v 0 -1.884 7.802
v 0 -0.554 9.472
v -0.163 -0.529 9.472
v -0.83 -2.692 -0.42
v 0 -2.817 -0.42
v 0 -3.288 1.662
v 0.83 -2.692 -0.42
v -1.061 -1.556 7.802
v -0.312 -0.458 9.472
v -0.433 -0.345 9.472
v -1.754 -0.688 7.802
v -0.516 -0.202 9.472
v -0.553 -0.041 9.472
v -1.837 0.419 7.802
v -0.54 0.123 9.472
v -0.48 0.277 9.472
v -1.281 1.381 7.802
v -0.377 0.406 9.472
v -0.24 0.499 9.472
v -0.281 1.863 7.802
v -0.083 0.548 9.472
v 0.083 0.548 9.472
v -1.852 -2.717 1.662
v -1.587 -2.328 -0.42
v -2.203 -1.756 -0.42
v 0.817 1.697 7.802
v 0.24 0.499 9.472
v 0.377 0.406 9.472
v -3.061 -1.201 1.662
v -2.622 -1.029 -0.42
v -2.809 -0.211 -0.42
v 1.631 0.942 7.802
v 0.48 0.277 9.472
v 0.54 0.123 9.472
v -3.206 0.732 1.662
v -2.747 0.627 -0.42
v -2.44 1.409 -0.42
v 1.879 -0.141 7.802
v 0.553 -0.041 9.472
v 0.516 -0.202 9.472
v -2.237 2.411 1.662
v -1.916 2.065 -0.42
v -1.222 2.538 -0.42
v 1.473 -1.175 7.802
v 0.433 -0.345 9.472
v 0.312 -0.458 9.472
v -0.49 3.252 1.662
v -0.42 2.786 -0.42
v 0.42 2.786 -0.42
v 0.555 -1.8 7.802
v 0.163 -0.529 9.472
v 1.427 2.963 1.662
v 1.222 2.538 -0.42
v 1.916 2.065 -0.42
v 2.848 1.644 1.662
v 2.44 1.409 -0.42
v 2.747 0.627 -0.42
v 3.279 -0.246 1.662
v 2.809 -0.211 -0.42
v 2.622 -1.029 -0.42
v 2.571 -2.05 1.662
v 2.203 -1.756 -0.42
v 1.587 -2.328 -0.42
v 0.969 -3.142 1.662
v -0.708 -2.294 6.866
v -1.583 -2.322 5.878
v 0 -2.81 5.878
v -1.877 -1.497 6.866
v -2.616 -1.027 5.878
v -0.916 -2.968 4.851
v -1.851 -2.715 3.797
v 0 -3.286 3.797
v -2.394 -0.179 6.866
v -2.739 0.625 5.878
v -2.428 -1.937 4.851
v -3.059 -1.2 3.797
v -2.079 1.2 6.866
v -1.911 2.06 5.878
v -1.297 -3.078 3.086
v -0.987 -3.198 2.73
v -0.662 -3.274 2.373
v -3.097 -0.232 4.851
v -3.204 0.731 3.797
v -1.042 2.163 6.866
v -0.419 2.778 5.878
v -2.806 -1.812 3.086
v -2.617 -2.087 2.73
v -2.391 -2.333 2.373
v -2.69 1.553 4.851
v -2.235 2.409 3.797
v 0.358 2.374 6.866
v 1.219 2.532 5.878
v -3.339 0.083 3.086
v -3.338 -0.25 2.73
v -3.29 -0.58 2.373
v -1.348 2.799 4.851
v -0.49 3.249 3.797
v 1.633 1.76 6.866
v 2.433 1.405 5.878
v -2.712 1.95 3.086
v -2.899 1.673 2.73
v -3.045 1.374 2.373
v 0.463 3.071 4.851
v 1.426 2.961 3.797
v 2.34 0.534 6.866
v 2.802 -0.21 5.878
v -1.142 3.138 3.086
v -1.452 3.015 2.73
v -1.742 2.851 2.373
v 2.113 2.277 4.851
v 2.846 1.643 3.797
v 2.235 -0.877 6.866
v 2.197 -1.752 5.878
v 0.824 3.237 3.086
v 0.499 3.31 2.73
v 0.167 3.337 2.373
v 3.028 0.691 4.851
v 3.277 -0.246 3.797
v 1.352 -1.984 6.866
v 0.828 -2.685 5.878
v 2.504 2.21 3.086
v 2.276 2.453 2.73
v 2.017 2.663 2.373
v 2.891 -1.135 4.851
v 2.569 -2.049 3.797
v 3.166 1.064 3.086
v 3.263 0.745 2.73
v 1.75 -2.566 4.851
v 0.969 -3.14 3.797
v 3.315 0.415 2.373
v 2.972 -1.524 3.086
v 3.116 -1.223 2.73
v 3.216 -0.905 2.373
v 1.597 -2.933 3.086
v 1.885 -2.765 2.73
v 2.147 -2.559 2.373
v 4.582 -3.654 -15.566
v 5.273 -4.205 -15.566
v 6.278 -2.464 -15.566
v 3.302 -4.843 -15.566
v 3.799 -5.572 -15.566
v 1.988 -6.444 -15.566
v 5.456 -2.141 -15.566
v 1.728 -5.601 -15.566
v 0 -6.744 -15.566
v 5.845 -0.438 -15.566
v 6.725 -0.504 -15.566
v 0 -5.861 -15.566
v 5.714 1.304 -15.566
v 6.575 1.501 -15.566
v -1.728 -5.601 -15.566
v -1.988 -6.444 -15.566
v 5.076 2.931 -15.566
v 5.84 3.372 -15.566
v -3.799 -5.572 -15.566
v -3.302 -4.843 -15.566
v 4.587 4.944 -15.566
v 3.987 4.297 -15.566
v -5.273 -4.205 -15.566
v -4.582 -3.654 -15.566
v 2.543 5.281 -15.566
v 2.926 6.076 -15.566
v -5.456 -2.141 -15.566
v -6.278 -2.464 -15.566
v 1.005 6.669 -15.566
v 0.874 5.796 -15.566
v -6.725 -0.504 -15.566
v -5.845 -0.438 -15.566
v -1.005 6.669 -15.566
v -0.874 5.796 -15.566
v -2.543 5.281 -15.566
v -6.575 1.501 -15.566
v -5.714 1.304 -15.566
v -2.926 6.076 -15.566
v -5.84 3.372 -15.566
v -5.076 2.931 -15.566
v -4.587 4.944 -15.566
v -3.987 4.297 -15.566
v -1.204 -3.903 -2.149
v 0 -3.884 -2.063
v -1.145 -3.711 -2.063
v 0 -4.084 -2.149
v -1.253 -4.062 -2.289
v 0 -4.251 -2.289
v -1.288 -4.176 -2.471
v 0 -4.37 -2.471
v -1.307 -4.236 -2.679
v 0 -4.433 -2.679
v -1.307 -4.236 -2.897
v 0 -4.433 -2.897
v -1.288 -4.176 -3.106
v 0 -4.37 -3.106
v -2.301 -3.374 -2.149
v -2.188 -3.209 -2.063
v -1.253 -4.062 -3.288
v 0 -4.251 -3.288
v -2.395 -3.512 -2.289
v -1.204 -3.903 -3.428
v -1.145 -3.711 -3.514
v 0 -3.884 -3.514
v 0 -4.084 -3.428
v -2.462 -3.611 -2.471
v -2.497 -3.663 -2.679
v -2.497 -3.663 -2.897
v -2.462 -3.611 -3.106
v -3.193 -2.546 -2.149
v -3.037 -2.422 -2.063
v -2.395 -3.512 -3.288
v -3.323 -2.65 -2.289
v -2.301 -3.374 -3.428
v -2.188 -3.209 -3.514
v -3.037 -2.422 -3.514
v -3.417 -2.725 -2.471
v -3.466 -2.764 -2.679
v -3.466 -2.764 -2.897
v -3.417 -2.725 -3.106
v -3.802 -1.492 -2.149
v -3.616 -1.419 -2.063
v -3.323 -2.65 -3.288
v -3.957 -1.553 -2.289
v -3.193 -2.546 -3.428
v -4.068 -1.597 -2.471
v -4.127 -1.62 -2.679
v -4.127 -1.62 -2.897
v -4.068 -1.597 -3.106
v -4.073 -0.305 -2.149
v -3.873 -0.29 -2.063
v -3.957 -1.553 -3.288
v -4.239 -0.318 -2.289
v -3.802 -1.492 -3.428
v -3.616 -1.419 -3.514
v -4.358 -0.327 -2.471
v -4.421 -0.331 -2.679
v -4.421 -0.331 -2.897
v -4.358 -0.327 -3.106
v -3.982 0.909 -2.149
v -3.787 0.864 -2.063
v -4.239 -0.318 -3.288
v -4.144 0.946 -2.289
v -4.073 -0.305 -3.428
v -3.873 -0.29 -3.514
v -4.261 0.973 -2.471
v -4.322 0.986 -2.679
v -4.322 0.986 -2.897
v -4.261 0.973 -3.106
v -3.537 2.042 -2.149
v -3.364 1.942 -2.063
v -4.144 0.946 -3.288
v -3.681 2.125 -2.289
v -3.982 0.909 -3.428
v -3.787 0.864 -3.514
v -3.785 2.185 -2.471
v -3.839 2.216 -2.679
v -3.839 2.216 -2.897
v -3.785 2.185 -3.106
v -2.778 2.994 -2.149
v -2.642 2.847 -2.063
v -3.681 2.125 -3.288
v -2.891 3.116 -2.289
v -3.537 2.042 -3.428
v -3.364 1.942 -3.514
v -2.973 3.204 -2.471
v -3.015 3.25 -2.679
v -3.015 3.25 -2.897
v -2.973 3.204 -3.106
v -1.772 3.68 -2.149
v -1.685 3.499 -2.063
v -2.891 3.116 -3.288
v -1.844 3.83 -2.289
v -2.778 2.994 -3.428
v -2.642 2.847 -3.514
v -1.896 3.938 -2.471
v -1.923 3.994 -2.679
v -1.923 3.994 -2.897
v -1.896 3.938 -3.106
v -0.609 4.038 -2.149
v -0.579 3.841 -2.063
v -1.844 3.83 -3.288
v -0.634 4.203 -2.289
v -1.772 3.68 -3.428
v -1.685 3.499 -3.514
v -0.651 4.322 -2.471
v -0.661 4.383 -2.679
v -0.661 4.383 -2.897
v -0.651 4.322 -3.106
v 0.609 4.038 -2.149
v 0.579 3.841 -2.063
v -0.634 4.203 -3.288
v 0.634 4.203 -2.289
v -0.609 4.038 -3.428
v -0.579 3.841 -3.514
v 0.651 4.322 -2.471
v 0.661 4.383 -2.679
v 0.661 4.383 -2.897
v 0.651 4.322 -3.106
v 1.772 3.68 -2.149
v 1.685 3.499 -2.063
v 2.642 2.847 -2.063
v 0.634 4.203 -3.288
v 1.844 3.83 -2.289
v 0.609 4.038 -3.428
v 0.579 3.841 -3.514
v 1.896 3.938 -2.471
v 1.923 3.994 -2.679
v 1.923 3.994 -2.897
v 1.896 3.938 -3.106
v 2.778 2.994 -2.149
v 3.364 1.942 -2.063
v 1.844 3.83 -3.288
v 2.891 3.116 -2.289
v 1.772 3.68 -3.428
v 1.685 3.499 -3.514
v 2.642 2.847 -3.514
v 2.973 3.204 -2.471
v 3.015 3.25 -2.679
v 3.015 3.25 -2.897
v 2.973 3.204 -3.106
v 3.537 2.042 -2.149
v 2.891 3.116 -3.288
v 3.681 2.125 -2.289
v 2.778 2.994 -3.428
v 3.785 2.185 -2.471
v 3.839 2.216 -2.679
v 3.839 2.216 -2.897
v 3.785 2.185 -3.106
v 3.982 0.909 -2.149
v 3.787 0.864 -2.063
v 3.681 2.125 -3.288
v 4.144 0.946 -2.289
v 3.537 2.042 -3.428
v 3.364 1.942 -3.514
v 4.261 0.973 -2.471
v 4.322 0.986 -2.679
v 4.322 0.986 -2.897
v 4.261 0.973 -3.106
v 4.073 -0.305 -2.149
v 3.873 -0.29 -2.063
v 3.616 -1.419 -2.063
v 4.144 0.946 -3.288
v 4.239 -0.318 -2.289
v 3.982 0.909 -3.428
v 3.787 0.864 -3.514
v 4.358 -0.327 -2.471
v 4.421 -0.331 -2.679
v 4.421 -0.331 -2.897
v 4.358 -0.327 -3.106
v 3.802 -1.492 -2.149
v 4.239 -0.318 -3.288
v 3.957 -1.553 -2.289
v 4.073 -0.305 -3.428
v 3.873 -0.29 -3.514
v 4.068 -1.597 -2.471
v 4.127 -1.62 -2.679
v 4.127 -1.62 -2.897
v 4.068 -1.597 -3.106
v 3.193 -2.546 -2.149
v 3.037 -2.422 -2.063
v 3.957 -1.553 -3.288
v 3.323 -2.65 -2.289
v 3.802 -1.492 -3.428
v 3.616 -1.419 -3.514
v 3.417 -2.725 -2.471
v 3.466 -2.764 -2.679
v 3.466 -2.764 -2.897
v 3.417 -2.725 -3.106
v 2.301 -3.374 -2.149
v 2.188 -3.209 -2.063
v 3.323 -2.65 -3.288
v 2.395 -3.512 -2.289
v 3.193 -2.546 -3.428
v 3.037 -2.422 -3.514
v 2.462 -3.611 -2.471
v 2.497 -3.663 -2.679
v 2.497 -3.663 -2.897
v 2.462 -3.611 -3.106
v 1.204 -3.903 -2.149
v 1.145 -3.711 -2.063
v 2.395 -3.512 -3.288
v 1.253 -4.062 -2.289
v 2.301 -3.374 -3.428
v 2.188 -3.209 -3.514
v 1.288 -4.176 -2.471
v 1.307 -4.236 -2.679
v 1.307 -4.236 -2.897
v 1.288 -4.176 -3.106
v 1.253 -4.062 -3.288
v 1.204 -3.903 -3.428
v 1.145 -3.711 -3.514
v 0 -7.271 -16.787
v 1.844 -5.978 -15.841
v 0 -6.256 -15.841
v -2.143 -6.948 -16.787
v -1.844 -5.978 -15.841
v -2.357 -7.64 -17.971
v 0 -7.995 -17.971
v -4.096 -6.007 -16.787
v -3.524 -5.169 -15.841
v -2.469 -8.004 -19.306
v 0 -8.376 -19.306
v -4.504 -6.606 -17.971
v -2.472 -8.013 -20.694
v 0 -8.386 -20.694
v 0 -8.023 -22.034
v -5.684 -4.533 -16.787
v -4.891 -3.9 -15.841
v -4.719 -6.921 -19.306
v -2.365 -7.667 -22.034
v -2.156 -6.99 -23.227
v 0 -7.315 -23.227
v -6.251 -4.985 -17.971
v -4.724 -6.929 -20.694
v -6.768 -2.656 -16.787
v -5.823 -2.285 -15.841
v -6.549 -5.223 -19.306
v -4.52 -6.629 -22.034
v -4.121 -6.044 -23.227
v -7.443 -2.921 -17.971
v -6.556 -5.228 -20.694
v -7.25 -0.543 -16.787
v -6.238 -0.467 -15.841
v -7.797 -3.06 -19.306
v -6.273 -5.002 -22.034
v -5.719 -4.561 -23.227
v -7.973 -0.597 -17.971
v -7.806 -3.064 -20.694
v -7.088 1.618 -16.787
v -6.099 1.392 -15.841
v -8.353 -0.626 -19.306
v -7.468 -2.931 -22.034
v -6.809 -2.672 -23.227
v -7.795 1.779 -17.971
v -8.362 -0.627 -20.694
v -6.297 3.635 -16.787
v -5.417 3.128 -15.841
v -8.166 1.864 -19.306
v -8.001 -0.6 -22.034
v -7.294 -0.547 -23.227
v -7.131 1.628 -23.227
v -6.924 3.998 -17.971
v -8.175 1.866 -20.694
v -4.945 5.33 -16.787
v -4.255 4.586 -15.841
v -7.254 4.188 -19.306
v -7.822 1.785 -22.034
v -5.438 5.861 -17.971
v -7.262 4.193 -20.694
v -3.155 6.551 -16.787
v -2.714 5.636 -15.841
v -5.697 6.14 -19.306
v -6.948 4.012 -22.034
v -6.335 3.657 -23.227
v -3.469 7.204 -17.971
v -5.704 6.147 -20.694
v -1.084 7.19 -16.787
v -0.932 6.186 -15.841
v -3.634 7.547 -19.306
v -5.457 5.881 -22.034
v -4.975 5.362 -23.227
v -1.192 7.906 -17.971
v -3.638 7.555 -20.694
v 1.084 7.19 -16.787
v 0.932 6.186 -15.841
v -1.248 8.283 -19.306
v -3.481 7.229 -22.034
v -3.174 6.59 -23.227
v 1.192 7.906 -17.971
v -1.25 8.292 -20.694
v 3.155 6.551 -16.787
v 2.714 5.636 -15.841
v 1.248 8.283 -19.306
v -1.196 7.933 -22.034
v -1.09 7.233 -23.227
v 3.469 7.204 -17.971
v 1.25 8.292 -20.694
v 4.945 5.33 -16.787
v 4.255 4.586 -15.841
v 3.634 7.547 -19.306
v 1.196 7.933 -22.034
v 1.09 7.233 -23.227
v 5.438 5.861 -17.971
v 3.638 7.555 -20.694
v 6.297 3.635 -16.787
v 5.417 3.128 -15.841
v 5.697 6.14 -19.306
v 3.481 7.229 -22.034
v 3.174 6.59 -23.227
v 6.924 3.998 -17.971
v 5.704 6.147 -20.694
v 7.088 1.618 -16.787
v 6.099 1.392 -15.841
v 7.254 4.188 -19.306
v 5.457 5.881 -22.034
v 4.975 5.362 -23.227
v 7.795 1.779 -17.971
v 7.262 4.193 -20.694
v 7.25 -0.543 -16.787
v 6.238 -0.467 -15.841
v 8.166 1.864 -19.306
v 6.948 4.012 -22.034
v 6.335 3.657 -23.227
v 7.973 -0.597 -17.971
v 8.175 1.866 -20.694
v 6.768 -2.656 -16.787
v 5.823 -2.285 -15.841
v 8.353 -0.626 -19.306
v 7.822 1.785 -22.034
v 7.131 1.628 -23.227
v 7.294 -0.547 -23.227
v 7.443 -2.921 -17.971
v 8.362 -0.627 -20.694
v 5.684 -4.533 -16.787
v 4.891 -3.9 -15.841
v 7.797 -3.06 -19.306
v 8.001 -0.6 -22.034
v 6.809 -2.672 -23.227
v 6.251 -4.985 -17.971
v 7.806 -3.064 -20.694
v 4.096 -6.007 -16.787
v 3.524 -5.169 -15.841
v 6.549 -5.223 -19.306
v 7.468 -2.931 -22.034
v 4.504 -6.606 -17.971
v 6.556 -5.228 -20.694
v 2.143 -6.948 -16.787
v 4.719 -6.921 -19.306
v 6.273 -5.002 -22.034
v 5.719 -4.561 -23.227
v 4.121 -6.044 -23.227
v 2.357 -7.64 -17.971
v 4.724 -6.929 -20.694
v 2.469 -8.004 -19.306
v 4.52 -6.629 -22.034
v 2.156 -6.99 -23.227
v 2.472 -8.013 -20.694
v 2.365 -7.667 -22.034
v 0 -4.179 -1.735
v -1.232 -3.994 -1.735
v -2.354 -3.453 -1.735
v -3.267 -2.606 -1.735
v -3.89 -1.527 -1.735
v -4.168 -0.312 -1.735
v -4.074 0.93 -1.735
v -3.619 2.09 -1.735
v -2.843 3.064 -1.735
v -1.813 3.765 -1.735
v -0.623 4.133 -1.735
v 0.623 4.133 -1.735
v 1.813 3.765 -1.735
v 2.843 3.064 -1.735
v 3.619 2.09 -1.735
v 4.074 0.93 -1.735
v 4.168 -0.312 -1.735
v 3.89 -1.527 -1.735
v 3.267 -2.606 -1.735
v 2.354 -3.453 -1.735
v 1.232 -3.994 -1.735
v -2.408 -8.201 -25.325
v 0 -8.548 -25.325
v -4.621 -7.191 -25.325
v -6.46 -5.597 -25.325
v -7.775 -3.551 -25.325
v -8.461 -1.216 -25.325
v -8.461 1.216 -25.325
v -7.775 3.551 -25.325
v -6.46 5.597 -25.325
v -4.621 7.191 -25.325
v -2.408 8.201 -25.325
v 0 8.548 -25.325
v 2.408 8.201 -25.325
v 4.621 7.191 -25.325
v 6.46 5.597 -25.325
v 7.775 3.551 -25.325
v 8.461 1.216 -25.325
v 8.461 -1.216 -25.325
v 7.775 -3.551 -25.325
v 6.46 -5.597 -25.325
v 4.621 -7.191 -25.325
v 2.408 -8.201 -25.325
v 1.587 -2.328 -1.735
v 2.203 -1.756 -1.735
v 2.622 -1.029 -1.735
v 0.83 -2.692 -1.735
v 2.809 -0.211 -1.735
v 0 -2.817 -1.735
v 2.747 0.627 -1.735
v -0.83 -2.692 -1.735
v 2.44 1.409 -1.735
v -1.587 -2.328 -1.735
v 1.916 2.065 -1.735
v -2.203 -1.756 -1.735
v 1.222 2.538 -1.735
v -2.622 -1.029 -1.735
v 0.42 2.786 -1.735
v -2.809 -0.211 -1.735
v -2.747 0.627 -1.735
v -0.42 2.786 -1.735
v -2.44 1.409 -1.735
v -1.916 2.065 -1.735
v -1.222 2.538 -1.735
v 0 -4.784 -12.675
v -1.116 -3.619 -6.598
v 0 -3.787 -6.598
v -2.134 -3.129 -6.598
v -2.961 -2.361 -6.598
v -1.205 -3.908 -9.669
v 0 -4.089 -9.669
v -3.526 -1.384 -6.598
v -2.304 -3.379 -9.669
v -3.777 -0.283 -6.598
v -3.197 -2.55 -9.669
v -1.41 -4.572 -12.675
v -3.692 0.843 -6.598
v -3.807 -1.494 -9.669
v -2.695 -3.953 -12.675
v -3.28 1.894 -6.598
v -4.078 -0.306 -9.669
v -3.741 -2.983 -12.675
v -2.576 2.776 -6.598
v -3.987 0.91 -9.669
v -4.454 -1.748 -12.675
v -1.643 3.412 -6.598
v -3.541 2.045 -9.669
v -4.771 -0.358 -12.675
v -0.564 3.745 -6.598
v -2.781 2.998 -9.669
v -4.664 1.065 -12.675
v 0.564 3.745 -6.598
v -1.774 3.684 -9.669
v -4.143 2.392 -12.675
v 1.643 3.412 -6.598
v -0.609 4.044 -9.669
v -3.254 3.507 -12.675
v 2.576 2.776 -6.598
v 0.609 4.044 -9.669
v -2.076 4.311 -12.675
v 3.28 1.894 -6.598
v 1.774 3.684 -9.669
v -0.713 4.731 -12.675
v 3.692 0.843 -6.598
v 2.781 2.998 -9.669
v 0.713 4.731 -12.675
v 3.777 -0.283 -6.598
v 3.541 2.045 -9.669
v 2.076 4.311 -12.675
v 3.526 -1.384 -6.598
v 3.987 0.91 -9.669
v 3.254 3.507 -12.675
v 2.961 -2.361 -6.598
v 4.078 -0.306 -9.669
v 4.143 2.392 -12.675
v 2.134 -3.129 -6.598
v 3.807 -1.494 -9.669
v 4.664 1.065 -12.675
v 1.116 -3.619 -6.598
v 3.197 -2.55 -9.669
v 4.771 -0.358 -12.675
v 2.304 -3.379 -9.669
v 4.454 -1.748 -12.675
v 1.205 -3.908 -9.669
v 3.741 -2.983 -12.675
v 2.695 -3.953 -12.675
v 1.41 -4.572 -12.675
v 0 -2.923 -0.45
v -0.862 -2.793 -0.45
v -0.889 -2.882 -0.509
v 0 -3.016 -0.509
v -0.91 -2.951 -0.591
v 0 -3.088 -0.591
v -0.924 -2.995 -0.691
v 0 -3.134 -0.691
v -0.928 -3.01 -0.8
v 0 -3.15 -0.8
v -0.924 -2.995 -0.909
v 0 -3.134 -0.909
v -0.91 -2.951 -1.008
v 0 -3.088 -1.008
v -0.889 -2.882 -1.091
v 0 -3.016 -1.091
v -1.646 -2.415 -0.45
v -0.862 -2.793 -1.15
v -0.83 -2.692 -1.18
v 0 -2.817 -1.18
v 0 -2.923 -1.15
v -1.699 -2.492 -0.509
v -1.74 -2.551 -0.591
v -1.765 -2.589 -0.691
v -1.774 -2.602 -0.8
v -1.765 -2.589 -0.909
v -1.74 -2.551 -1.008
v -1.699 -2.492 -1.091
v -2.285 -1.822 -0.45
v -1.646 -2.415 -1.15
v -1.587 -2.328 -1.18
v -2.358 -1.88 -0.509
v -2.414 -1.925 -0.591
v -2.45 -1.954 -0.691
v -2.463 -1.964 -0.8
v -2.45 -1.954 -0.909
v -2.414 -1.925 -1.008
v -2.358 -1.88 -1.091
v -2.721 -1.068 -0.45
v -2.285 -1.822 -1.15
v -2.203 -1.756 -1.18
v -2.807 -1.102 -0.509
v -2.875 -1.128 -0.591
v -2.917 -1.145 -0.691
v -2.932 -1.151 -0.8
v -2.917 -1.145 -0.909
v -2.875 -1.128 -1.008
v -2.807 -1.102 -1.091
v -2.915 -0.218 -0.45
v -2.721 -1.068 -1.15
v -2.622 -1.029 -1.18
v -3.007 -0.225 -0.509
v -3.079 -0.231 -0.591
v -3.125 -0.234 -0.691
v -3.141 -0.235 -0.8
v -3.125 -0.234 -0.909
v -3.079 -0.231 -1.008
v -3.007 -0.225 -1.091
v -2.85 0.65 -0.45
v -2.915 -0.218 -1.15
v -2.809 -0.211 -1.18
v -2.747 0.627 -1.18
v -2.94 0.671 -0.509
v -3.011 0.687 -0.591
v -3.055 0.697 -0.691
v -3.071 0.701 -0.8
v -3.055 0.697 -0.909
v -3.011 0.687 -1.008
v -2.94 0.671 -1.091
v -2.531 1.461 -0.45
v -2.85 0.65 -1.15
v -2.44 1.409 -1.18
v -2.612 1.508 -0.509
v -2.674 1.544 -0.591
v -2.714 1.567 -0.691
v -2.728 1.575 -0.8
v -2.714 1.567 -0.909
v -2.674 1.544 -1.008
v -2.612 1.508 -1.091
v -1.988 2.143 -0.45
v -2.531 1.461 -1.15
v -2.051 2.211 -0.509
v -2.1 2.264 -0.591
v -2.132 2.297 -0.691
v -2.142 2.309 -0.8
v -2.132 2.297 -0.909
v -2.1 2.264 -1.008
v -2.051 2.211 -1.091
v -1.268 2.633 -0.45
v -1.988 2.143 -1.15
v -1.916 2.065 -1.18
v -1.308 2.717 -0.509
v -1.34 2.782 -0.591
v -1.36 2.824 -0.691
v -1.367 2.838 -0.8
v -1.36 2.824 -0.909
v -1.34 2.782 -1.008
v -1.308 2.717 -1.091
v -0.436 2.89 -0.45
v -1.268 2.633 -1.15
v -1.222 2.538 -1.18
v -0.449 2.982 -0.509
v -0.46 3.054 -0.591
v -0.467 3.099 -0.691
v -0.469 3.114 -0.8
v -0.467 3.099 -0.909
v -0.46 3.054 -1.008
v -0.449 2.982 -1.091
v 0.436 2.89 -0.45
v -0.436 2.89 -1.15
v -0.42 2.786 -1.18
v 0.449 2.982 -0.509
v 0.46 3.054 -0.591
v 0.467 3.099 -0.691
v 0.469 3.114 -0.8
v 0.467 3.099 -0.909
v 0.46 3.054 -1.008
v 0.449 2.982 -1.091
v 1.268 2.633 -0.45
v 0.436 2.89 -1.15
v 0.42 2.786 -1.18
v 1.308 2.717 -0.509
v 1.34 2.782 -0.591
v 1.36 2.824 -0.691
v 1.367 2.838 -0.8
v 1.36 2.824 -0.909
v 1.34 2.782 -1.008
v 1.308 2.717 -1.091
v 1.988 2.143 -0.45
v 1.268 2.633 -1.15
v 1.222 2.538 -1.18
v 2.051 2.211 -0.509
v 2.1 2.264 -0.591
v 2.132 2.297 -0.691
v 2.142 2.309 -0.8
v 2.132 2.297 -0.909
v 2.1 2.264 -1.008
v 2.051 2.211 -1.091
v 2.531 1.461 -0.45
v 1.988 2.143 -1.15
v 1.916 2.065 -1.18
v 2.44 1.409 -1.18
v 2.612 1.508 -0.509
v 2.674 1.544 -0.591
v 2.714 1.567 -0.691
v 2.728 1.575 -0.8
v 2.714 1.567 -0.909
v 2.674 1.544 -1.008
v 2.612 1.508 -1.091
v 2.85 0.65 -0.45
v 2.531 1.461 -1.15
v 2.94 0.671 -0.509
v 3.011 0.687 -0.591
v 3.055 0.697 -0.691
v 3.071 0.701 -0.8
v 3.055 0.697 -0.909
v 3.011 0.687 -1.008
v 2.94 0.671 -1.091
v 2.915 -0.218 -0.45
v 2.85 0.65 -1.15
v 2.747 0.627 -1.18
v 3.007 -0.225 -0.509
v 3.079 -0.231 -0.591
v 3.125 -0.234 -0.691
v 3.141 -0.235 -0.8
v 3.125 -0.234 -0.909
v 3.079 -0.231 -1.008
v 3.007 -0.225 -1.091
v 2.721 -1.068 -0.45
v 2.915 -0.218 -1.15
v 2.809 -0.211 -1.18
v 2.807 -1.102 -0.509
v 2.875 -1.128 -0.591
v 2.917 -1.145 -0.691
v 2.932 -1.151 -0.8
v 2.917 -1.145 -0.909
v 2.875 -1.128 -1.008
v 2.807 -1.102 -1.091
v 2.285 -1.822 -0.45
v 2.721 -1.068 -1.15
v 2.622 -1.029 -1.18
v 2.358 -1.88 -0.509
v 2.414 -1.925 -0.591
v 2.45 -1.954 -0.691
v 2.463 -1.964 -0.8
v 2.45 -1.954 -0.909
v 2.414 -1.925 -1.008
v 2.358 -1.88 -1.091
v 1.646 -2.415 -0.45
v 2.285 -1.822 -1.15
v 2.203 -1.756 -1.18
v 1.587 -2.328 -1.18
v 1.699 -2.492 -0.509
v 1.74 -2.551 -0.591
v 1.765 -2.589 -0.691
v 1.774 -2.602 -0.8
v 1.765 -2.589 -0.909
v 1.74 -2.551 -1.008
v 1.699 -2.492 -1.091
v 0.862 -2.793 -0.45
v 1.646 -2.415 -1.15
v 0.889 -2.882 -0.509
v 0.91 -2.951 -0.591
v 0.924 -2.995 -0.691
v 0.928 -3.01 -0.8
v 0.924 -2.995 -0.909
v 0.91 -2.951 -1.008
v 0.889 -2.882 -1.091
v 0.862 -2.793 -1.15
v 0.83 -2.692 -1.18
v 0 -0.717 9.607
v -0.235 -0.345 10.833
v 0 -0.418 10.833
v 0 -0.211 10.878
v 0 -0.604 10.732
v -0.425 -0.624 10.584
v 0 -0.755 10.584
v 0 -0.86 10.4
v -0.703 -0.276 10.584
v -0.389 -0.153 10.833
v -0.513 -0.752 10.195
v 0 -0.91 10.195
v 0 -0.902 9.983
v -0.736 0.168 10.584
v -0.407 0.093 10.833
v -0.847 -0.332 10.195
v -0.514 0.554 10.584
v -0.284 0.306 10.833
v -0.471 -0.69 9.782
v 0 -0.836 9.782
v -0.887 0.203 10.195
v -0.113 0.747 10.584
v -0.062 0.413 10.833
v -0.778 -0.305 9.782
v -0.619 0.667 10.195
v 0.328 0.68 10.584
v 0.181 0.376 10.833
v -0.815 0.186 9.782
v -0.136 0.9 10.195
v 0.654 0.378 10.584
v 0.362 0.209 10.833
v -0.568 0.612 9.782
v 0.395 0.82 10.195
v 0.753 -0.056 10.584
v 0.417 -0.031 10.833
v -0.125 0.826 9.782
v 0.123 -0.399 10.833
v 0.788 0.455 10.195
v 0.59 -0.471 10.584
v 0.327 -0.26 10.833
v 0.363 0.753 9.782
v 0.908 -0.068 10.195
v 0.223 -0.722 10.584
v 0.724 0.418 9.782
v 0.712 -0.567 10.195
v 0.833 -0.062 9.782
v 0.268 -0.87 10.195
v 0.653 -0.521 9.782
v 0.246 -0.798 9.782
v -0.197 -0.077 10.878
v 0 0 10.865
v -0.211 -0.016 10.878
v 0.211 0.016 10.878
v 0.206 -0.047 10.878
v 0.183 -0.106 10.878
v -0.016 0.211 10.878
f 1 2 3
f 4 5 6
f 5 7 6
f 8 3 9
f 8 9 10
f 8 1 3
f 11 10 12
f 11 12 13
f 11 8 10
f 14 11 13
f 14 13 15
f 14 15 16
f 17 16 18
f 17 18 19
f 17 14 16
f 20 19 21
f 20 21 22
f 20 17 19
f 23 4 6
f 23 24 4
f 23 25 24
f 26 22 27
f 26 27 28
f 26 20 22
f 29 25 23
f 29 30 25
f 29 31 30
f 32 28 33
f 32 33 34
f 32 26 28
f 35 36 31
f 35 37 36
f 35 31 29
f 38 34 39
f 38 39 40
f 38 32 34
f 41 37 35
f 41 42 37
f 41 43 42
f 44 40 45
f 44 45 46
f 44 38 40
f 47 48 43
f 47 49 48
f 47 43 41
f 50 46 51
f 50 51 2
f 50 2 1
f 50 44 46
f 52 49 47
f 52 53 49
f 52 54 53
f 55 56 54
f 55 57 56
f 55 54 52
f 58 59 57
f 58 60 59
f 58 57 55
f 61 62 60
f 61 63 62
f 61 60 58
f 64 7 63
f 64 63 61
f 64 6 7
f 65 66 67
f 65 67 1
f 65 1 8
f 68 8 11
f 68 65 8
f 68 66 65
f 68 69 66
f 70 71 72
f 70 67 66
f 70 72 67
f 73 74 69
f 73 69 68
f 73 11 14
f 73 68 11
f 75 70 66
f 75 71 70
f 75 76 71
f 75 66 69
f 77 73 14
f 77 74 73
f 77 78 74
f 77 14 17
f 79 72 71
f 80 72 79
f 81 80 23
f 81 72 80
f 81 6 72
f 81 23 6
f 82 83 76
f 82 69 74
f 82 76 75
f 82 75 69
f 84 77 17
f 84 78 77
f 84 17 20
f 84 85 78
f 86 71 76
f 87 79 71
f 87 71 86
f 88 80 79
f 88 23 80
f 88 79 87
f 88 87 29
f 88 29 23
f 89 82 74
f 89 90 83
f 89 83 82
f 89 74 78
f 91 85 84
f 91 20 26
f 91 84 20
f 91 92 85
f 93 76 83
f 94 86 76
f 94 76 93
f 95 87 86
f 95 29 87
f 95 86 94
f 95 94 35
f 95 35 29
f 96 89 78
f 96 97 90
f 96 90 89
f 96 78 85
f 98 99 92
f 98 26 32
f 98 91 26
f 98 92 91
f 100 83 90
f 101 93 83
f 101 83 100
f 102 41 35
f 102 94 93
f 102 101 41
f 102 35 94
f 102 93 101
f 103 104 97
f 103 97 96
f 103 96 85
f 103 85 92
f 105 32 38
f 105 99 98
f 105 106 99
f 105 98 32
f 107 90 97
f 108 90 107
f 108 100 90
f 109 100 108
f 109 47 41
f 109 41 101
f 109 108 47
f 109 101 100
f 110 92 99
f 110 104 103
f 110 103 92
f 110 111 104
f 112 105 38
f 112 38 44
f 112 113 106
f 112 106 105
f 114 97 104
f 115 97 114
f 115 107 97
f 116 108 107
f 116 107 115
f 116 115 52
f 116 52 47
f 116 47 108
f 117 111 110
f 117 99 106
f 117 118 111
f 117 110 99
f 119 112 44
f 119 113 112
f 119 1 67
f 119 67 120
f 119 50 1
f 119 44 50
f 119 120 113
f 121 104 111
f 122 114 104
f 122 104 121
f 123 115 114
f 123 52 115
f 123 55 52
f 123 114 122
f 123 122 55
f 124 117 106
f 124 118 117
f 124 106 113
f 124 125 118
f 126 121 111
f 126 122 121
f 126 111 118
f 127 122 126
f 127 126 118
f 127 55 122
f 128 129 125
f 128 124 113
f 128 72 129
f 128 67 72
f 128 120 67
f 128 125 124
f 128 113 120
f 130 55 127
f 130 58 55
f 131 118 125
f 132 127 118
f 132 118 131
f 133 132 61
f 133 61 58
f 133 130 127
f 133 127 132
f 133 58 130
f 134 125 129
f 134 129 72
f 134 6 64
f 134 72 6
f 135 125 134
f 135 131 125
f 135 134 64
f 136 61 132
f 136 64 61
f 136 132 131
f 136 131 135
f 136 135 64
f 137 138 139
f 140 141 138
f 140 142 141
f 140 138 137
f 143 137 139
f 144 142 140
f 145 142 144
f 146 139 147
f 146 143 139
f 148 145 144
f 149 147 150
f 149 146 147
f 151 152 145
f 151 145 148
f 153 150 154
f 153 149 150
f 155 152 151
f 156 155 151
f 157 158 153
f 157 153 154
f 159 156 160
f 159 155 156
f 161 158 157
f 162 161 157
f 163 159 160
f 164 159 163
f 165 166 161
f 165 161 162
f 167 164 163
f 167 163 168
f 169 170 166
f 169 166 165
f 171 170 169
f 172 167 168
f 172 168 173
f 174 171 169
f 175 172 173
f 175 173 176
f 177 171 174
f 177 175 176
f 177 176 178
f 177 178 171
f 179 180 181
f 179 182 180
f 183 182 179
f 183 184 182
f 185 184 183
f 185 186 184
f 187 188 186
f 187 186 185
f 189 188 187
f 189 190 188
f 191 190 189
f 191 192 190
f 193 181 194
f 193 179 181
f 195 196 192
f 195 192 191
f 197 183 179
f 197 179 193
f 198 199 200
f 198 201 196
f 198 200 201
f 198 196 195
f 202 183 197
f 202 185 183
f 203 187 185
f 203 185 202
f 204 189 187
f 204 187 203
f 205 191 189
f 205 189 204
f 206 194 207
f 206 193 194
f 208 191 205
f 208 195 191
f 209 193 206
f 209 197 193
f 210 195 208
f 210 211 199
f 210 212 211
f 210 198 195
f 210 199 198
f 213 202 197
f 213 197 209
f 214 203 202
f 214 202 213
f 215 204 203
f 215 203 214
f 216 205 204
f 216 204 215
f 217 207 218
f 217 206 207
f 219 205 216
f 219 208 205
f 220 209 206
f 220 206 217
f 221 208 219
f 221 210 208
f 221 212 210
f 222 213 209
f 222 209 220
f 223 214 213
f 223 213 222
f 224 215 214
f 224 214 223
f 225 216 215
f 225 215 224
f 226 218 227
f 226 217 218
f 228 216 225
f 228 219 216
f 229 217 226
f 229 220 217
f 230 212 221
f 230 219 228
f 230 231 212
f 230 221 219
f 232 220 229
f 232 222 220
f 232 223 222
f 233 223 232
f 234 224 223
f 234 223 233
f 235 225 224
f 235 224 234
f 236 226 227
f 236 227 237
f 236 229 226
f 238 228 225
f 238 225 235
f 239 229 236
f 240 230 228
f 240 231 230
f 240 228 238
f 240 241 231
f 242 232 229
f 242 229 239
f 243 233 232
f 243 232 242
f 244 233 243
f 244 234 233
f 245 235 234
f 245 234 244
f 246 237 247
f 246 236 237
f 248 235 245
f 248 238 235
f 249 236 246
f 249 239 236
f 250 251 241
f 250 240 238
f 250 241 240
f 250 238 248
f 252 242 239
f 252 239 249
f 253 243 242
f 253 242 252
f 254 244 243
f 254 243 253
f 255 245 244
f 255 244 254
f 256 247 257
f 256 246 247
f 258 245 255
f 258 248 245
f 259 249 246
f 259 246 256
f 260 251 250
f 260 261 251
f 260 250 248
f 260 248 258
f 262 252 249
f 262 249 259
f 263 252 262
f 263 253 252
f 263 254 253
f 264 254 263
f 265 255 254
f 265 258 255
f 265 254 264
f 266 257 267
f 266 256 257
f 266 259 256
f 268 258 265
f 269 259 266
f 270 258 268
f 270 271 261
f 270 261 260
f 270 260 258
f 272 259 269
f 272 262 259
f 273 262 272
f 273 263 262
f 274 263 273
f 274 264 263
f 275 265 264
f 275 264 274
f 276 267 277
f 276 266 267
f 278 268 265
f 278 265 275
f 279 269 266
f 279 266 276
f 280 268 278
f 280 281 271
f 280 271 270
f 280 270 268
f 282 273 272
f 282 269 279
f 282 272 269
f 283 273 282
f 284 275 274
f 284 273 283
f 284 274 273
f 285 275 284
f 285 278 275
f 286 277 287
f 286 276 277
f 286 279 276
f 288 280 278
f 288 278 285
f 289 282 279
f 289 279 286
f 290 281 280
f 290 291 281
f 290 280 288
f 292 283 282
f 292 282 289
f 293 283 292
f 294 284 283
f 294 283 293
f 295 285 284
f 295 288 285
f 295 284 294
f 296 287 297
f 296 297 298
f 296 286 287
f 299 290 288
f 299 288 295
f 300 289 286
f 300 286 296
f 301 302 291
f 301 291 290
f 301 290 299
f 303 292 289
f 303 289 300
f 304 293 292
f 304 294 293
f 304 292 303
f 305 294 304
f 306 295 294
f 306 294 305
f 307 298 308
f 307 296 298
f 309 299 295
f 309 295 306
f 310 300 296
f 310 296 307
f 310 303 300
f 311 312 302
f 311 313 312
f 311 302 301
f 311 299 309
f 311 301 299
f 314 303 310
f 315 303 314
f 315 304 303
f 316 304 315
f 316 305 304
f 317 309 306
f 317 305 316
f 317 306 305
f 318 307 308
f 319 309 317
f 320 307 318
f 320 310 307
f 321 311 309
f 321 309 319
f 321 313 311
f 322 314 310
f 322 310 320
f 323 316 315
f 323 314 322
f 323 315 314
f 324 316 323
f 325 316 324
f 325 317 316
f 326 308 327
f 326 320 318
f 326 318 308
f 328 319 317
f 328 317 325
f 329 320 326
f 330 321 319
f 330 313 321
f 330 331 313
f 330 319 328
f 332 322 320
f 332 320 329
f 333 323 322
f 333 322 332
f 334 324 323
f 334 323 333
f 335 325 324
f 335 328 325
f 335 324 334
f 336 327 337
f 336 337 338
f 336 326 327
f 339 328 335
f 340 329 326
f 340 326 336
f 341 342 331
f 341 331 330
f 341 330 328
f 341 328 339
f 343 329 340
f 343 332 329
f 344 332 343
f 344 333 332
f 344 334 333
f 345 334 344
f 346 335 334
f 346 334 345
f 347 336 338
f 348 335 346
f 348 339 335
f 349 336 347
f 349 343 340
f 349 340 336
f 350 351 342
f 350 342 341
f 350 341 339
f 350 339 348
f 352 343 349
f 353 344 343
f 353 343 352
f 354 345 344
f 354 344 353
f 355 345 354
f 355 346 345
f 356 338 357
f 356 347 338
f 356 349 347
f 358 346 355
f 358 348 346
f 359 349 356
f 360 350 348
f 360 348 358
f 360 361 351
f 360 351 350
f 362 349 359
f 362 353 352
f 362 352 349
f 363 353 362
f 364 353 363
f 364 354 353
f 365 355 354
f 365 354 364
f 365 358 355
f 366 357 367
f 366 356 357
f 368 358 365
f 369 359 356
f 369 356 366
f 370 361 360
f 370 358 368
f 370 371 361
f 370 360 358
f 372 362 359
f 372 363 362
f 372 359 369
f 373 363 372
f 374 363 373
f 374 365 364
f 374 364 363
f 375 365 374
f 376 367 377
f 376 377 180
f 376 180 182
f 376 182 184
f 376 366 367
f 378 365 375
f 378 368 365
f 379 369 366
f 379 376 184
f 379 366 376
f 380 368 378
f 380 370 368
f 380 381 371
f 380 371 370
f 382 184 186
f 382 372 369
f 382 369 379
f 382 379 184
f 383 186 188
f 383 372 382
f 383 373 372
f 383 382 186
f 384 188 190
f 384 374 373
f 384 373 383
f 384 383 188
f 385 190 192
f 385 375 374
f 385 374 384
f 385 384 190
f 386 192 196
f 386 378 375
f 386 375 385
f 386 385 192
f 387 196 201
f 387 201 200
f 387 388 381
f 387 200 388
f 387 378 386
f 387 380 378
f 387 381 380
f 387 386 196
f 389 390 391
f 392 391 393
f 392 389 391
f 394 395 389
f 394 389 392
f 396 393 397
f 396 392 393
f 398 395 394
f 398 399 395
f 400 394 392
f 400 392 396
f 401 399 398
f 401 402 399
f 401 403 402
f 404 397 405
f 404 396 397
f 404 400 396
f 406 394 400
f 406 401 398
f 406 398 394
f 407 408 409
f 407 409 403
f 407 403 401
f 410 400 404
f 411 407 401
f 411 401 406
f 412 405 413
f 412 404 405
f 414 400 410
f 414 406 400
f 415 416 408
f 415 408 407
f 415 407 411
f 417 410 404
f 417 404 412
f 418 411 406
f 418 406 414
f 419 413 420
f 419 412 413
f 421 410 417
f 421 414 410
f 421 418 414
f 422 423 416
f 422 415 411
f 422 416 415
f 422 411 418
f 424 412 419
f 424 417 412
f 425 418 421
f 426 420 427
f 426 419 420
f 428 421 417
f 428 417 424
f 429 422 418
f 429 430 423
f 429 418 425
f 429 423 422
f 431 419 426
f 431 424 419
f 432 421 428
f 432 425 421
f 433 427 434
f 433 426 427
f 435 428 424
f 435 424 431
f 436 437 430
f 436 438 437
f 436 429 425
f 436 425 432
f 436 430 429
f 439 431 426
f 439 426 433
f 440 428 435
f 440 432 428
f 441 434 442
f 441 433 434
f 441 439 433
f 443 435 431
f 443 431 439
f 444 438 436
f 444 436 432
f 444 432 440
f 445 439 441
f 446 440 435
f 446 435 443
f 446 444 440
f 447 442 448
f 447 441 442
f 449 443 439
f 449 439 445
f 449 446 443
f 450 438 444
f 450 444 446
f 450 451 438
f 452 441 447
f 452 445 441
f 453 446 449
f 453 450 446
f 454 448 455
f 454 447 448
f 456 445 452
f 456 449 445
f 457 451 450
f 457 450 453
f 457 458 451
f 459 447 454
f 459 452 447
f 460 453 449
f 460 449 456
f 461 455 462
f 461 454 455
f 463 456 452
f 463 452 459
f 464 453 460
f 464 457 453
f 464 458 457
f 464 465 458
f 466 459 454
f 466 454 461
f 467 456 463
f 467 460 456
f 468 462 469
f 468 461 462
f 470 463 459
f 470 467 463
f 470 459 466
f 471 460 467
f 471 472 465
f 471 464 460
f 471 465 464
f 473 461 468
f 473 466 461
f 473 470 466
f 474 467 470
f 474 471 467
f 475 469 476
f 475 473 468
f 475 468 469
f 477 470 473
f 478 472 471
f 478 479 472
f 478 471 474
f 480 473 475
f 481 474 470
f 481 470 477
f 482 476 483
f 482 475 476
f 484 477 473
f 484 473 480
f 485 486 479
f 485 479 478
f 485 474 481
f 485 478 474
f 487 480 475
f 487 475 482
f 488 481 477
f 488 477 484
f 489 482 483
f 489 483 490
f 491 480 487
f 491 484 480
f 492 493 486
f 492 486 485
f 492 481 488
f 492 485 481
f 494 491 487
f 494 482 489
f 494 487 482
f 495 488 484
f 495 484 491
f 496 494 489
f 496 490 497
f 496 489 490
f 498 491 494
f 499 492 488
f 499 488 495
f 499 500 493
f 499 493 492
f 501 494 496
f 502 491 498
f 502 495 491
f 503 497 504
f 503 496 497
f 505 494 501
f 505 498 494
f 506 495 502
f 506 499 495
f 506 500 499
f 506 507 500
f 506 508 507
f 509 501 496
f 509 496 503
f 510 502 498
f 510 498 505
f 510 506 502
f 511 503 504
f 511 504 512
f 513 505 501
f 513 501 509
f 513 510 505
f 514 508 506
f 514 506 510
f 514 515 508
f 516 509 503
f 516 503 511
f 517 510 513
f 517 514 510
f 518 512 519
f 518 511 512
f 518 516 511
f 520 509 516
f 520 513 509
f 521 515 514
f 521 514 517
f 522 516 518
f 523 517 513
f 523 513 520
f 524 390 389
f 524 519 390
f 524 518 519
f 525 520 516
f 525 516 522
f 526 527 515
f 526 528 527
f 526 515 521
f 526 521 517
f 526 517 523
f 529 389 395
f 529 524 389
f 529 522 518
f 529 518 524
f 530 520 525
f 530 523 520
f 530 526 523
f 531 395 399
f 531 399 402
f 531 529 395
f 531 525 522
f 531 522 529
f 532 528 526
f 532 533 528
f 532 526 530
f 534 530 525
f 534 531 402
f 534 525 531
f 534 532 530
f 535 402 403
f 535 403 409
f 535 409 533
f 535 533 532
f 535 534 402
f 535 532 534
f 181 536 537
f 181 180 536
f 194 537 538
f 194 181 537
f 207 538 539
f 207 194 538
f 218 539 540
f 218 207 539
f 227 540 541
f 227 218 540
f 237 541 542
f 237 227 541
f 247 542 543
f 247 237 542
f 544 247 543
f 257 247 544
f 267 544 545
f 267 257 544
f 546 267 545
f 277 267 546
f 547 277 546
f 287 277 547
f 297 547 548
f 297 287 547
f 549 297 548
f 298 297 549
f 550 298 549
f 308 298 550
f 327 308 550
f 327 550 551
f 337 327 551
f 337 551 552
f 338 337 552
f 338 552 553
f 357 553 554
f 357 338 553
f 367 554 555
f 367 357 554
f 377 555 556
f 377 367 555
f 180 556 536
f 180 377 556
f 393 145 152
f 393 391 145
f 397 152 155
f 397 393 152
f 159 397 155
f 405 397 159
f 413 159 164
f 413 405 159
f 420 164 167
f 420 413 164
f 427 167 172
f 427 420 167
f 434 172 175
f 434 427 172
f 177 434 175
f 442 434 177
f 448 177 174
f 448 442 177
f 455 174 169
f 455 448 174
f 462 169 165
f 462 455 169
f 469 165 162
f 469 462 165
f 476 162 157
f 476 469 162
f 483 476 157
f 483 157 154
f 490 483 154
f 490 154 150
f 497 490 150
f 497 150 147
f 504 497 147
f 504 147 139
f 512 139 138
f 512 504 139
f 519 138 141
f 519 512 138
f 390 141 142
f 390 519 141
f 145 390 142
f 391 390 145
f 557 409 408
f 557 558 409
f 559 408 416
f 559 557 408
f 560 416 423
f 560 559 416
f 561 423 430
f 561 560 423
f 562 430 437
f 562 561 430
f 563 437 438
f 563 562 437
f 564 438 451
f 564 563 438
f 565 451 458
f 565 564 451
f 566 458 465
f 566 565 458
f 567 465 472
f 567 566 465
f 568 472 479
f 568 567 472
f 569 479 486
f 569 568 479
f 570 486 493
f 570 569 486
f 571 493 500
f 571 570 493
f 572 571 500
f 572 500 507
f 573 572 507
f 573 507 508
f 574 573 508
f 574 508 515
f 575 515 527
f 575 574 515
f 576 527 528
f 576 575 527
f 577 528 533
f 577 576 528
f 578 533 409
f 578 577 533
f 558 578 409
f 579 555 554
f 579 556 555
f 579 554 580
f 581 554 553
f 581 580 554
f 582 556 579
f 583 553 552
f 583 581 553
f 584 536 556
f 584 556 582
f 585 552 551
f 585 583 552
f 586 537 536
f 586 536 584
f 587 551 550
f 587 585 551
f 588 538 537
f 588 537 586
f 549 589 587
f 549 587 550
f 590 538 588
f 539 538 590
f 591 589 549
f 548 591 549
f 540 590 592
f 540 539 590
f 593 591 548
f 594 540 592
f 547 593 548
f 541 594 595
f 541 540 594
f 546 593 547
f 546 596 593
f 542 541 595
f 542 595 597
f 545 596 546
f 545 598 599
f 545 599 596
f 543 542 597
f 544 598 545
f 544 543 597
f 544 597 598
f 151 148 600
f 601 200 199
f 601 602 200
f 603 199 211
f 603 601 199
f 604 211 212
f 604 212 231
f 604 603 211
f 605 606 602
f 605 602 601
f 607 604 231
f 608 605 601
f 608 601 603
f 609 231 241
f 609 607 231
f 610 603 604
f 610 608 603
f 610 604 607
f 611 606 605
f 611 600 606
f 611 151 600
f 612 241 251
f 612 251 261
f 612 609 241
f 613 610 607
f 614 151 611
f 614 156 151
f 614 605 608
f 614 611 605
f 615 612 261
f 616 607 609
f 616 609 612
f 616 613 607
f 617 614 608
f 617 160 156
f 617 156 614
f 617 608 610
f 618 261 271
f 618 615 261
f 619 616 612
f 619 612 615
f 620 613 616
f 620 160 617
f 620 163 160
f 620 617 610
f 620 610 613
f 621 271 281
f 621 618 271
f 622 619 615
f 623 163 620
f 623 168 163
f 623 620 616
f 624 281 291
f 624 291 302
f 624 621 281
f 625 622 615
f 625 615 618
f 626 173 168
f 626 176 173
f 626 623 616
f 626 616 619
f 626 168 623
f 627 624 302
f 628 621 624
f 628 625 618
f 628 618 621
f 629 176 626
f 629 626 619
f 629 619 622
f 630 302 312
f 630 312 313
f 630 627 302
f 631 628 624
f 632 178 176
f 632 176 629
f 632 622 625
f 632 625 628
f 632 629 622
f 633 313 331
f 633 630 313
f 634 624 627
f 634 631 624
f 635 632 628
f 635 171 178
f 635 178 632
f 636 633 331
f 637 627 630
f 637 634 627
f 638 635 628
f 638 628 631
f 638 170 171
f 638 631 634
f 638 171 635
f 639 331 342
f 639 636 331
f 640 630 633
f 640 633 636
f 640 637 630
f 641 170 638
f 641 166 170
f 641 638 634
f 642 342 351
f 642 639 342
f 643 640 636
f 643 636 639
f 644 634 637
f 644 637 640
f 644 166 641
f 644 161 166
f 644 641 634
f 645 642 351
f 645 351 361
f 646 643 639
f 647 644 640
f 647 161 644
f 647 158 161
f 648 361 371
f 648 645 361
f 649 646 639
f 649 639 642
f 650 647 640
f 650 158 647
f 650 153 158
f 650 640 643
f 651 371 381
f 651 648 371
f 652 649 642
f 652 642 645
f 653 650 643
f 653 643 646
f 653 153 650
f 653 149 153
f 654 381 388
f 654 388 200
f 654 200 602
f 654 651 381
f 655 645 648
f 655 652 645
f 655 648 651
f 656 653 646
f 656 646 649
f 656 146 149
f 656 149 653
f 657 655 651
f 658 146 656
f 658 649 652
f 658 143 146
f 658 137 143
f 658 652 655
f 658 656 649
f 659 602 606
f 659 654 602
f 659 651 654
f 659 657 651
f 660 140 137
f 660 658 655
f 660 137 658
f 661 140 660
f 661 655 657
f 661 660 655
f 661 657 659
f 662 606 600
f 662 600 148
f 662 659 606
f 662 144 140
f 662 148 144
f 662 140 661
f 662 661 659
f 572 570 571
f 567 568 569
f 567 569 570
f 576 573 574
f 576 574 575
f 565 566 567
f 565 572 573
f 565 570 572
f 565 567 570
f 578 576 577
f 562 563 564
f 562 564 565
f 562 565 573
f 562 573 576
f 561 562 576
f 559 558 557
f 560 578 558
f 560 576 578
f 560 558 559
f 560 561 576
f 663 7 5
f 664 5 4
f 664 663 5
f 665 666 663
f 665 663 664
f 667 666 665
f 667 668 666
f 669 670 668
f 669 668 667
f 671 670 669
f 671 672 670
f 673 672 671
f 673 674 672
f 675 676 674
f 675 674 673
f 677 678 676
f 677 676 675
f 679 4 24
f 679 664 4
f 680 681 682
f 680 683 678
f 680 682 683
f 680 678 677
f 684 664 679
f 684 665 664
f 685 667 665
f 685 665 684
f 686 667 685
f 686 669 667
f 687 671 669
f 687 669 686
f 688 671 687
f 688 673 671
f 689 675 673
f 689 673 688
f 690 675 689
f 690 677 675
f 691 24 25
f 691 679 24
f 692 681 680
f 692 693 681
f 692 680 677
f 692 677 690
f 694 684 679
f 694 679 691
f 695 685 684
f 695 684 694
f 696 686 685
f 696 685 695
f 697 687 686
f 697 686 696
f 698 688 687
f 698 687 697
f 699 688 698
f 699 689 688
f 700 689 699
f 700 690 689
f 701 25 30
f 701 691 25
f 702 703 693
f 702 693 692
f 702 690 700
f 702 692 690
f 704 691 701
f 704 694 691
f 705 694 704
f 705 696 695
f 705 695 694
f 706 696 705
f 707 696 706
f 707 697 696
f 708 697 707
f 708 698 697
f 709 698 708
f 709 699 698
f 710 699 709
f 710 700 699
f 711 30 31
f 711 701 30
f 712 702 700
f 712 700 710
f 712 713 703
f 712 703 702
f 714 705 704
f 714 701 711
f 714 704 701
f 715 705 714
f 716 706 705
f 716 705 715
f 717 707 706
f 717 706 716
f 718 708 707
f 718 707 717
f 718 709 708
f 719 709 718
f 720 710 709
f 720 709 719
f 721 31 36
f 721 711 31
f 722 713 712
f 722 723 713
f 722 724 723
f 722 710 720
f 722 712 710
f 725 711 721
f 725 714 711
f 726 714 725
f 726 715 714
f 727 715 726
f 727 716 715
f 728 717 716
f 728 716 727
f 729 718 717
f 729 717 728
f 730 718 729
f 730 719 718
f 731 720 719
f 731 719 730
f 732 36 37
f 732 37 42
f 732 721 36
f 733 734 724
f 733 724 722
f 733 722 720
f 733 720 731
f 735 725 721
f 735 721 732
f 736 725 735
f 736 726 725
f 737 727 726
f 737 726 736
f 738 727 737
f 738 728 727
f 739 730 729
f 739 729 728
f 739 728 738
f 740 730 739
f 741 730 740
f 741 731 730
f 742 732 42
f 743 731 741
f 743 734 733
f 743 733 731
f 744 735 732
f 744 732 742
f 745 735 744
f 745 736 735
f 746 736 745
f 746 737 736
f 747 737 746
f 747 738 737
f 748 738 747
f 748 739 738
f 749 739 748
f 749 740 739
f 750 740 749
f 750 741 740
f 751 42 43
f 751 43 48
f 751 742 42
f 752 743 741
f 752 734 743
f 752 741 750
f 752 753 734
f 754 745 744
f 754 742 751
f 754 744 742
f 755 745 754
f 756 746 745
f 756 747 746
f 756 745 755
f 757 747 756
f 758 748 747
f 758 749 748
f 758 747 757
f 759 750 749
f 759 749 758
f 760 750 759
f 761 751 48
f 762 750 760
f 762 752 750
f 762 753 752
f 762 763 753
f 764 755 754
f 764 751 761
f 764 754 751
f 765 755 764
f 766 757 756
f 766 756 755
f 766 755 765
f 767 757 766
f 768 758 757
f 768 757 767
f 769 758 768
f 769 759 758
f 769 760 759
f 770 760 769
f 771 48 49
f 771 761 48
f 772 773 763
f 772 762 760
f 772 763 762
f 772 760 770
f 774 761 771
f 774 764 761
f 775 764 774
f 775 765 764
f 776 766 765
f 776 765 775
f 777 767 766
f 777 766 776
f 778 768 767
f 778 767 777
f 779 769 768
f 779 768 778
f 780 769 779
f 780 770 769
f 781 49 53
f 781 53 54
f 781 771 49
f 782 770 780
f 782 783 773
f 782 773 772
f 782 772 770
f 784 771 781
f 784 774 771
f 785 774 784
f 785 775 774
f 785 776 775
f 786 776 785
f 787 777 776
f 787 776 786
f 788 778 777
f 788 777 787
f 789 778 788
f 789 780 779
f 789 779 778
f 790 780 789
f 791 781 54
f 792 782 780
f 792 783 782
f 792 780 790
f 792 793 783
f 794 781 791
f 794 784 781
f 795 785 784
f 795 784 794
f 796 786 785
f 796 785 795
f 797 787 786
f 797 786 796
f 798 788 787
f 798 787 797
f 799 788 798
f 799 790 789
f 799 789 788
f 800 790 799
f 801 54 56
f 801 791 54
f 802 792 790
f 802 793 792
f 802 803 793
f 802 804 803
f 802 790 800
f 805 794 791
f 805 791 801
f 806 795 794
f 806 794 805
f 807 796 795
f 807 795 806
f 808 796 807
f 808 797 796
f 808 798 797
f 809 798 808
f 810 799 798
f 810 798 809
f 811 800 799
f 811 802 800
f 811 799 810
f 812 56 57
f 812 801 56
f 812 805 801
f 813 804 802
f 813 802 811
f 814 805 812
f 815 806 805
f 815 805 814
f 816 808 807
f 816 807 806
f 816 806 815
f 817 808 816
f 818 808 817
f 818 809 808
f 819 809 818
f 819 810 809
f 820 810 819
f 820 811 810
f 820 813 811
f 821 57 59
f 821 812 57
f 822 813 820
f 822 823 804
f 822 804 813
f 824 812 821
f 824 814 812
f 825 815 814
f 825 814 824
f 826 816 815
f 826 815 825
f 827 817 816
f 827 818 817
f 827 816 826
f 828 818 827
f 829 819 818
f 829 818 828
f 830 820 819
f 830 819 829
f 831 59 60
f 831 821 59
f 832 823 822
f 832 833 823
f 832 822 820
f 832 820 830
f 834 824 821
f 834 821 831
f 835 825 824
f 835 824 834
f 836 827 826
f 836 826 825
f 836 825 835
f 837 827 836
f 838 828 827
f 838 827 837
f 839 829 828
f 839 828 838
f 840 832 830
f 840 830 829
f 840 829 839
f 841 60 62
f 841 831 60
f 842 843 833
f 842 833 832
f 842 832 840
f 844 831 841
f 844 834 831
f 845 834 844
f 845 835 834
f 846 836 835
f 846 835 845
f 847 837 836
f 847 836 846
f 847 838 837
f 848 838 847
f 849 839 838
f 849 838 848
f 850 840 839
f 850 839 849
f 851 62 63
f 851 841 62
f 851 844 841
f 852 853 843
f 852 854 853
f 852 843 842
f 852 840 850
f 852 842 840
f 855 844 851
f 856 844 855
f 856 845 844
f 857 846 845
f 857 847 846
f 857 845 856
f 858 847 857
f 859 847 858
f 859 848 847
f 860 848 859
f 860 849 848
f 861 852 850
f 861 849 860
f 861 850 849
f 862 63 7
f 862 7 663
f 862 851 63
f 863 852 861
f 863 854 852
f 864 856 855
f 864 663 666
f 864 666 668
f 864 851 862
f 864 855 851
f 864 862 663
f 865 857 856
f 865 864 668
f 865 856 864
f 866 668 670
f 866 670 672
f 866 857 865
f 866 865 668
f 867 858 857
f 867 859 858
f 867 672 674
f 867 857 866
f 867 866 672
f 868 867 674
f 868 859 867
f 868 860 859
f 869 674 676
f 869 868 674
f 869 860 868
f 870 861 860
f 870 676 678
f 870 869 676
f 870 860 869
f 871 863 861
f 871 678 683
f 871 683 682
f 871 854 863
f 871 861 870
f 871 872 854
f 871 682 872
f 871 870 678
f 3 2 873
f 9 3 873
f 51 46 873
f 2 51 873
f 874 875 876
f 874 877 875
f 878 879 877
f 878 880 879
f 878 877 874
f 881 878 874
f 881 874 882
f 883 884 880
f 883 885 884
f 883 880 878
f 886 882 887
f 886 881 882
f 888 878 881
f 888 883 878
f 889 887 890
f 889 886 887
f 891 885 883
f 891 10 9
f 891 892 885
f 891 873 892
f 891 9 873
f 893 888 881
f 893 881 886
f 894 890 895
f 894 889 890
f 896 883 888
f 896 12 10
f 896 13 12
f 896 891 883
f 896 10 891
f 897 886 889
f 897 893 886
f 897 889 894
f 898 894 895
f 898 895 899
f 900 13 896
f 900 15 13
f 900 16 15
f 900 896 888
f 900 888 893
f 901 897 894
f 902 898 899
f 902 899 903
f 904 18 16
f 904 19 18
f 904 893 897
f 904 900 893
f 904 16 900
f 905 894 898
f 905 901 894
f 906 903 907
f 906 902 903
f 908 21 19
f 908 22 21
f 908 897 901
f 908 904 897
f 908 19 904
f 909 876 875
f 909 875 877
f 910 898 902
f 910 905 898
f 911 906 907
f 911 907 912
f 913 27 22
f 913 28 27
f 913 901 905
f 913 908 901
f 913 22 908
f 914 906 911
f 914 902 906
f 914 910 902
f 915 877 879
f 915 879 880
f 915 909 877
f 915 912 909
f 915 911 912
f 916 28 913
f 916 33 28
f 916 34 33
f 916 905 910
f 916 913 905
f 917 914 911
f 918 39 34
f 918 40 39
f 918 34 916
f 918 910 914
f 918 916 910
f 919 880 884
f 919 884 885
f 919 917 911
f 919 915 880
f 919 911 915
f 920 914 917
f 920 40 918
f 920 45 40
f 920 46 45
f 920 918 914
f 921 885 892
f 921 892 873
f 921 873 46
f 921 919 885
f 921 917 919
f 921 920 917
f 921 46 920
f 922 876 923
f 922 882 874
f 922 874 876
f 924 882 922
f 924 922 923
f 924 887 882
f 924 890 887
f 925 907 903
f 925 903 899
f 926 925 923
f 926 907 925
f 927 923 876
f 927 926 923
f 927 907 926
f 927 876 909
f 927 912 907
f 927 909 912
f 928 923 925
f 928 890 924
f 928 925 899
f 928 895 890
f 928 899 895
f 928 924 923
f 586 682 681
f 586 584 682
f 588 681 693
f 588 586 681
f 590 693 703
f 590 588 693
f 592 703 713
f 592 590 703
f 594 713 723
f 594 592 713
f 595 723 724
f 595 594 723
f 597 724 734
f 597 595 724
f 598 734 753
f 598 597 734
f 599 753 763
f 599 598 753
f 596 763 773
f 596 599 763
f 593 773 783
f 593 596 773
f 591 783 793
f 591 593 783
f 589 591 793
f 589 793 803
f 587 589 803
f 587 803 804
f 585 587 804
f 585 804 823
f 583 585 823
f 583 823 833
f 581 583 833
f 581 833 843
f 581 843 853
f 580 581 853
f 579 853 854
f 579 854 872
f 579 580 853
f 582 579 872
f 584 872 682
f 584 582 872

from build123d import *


with BuildPart() as f1:
    # F0 (on Right) → F1 (revolve)
    with BuildSketch(Plane.YZ):
        with BuildLine():
            Line((-6.743999, -15.566447), (-6.255512, -15.840568))
            ThreePointArc((-6.255512, -15.840568), (-8.376245, -19.305821), (-7.314796, -23.227405))
            Line((-7.314796, -23.227405), (-8.547529, -25.32473))
            Line((-8.547529, -25.32473), (0, -25.32473))
            Line((0, -25.32473), (0, 10.865145))
            ThreePointArc((0, 10.865145), (-0.859939, 10.400332), (-0.554096, 9.471889))
            ThreePointArc((-0.554096, 9.471889), (-3.106124, 4.850887), (-2.817132, -0.42007))
            ThreePointArc((-2.817132, -0.42007), (-3.149678, -0.799906), (-2.817132, -1.179742))
            Line((-2.817132, -1.179742), (-2.817132, -1.734666))
            Line((-2.817132, -1.734666), (-4.179219, -1.734666))
            Line((-4.179219, -1.734666), (-3.884023, -2.062576))
            ThreePointArc((-3.884023, -2.062576), (-4.44089, -2.78825), (-3.884023, -3.513924))
            ThreePointArc((-3.884023, -3.513924), (-4.089212, -9.668694), (-5.861165, -15.566447))
            Line((-5.861165, -15.566447), (-6.743999, -15.566447))
        make_face()
    revolve(axis=Axis((0, 0, -7.229792), (0, 0, -1)))


solid = f1.part
